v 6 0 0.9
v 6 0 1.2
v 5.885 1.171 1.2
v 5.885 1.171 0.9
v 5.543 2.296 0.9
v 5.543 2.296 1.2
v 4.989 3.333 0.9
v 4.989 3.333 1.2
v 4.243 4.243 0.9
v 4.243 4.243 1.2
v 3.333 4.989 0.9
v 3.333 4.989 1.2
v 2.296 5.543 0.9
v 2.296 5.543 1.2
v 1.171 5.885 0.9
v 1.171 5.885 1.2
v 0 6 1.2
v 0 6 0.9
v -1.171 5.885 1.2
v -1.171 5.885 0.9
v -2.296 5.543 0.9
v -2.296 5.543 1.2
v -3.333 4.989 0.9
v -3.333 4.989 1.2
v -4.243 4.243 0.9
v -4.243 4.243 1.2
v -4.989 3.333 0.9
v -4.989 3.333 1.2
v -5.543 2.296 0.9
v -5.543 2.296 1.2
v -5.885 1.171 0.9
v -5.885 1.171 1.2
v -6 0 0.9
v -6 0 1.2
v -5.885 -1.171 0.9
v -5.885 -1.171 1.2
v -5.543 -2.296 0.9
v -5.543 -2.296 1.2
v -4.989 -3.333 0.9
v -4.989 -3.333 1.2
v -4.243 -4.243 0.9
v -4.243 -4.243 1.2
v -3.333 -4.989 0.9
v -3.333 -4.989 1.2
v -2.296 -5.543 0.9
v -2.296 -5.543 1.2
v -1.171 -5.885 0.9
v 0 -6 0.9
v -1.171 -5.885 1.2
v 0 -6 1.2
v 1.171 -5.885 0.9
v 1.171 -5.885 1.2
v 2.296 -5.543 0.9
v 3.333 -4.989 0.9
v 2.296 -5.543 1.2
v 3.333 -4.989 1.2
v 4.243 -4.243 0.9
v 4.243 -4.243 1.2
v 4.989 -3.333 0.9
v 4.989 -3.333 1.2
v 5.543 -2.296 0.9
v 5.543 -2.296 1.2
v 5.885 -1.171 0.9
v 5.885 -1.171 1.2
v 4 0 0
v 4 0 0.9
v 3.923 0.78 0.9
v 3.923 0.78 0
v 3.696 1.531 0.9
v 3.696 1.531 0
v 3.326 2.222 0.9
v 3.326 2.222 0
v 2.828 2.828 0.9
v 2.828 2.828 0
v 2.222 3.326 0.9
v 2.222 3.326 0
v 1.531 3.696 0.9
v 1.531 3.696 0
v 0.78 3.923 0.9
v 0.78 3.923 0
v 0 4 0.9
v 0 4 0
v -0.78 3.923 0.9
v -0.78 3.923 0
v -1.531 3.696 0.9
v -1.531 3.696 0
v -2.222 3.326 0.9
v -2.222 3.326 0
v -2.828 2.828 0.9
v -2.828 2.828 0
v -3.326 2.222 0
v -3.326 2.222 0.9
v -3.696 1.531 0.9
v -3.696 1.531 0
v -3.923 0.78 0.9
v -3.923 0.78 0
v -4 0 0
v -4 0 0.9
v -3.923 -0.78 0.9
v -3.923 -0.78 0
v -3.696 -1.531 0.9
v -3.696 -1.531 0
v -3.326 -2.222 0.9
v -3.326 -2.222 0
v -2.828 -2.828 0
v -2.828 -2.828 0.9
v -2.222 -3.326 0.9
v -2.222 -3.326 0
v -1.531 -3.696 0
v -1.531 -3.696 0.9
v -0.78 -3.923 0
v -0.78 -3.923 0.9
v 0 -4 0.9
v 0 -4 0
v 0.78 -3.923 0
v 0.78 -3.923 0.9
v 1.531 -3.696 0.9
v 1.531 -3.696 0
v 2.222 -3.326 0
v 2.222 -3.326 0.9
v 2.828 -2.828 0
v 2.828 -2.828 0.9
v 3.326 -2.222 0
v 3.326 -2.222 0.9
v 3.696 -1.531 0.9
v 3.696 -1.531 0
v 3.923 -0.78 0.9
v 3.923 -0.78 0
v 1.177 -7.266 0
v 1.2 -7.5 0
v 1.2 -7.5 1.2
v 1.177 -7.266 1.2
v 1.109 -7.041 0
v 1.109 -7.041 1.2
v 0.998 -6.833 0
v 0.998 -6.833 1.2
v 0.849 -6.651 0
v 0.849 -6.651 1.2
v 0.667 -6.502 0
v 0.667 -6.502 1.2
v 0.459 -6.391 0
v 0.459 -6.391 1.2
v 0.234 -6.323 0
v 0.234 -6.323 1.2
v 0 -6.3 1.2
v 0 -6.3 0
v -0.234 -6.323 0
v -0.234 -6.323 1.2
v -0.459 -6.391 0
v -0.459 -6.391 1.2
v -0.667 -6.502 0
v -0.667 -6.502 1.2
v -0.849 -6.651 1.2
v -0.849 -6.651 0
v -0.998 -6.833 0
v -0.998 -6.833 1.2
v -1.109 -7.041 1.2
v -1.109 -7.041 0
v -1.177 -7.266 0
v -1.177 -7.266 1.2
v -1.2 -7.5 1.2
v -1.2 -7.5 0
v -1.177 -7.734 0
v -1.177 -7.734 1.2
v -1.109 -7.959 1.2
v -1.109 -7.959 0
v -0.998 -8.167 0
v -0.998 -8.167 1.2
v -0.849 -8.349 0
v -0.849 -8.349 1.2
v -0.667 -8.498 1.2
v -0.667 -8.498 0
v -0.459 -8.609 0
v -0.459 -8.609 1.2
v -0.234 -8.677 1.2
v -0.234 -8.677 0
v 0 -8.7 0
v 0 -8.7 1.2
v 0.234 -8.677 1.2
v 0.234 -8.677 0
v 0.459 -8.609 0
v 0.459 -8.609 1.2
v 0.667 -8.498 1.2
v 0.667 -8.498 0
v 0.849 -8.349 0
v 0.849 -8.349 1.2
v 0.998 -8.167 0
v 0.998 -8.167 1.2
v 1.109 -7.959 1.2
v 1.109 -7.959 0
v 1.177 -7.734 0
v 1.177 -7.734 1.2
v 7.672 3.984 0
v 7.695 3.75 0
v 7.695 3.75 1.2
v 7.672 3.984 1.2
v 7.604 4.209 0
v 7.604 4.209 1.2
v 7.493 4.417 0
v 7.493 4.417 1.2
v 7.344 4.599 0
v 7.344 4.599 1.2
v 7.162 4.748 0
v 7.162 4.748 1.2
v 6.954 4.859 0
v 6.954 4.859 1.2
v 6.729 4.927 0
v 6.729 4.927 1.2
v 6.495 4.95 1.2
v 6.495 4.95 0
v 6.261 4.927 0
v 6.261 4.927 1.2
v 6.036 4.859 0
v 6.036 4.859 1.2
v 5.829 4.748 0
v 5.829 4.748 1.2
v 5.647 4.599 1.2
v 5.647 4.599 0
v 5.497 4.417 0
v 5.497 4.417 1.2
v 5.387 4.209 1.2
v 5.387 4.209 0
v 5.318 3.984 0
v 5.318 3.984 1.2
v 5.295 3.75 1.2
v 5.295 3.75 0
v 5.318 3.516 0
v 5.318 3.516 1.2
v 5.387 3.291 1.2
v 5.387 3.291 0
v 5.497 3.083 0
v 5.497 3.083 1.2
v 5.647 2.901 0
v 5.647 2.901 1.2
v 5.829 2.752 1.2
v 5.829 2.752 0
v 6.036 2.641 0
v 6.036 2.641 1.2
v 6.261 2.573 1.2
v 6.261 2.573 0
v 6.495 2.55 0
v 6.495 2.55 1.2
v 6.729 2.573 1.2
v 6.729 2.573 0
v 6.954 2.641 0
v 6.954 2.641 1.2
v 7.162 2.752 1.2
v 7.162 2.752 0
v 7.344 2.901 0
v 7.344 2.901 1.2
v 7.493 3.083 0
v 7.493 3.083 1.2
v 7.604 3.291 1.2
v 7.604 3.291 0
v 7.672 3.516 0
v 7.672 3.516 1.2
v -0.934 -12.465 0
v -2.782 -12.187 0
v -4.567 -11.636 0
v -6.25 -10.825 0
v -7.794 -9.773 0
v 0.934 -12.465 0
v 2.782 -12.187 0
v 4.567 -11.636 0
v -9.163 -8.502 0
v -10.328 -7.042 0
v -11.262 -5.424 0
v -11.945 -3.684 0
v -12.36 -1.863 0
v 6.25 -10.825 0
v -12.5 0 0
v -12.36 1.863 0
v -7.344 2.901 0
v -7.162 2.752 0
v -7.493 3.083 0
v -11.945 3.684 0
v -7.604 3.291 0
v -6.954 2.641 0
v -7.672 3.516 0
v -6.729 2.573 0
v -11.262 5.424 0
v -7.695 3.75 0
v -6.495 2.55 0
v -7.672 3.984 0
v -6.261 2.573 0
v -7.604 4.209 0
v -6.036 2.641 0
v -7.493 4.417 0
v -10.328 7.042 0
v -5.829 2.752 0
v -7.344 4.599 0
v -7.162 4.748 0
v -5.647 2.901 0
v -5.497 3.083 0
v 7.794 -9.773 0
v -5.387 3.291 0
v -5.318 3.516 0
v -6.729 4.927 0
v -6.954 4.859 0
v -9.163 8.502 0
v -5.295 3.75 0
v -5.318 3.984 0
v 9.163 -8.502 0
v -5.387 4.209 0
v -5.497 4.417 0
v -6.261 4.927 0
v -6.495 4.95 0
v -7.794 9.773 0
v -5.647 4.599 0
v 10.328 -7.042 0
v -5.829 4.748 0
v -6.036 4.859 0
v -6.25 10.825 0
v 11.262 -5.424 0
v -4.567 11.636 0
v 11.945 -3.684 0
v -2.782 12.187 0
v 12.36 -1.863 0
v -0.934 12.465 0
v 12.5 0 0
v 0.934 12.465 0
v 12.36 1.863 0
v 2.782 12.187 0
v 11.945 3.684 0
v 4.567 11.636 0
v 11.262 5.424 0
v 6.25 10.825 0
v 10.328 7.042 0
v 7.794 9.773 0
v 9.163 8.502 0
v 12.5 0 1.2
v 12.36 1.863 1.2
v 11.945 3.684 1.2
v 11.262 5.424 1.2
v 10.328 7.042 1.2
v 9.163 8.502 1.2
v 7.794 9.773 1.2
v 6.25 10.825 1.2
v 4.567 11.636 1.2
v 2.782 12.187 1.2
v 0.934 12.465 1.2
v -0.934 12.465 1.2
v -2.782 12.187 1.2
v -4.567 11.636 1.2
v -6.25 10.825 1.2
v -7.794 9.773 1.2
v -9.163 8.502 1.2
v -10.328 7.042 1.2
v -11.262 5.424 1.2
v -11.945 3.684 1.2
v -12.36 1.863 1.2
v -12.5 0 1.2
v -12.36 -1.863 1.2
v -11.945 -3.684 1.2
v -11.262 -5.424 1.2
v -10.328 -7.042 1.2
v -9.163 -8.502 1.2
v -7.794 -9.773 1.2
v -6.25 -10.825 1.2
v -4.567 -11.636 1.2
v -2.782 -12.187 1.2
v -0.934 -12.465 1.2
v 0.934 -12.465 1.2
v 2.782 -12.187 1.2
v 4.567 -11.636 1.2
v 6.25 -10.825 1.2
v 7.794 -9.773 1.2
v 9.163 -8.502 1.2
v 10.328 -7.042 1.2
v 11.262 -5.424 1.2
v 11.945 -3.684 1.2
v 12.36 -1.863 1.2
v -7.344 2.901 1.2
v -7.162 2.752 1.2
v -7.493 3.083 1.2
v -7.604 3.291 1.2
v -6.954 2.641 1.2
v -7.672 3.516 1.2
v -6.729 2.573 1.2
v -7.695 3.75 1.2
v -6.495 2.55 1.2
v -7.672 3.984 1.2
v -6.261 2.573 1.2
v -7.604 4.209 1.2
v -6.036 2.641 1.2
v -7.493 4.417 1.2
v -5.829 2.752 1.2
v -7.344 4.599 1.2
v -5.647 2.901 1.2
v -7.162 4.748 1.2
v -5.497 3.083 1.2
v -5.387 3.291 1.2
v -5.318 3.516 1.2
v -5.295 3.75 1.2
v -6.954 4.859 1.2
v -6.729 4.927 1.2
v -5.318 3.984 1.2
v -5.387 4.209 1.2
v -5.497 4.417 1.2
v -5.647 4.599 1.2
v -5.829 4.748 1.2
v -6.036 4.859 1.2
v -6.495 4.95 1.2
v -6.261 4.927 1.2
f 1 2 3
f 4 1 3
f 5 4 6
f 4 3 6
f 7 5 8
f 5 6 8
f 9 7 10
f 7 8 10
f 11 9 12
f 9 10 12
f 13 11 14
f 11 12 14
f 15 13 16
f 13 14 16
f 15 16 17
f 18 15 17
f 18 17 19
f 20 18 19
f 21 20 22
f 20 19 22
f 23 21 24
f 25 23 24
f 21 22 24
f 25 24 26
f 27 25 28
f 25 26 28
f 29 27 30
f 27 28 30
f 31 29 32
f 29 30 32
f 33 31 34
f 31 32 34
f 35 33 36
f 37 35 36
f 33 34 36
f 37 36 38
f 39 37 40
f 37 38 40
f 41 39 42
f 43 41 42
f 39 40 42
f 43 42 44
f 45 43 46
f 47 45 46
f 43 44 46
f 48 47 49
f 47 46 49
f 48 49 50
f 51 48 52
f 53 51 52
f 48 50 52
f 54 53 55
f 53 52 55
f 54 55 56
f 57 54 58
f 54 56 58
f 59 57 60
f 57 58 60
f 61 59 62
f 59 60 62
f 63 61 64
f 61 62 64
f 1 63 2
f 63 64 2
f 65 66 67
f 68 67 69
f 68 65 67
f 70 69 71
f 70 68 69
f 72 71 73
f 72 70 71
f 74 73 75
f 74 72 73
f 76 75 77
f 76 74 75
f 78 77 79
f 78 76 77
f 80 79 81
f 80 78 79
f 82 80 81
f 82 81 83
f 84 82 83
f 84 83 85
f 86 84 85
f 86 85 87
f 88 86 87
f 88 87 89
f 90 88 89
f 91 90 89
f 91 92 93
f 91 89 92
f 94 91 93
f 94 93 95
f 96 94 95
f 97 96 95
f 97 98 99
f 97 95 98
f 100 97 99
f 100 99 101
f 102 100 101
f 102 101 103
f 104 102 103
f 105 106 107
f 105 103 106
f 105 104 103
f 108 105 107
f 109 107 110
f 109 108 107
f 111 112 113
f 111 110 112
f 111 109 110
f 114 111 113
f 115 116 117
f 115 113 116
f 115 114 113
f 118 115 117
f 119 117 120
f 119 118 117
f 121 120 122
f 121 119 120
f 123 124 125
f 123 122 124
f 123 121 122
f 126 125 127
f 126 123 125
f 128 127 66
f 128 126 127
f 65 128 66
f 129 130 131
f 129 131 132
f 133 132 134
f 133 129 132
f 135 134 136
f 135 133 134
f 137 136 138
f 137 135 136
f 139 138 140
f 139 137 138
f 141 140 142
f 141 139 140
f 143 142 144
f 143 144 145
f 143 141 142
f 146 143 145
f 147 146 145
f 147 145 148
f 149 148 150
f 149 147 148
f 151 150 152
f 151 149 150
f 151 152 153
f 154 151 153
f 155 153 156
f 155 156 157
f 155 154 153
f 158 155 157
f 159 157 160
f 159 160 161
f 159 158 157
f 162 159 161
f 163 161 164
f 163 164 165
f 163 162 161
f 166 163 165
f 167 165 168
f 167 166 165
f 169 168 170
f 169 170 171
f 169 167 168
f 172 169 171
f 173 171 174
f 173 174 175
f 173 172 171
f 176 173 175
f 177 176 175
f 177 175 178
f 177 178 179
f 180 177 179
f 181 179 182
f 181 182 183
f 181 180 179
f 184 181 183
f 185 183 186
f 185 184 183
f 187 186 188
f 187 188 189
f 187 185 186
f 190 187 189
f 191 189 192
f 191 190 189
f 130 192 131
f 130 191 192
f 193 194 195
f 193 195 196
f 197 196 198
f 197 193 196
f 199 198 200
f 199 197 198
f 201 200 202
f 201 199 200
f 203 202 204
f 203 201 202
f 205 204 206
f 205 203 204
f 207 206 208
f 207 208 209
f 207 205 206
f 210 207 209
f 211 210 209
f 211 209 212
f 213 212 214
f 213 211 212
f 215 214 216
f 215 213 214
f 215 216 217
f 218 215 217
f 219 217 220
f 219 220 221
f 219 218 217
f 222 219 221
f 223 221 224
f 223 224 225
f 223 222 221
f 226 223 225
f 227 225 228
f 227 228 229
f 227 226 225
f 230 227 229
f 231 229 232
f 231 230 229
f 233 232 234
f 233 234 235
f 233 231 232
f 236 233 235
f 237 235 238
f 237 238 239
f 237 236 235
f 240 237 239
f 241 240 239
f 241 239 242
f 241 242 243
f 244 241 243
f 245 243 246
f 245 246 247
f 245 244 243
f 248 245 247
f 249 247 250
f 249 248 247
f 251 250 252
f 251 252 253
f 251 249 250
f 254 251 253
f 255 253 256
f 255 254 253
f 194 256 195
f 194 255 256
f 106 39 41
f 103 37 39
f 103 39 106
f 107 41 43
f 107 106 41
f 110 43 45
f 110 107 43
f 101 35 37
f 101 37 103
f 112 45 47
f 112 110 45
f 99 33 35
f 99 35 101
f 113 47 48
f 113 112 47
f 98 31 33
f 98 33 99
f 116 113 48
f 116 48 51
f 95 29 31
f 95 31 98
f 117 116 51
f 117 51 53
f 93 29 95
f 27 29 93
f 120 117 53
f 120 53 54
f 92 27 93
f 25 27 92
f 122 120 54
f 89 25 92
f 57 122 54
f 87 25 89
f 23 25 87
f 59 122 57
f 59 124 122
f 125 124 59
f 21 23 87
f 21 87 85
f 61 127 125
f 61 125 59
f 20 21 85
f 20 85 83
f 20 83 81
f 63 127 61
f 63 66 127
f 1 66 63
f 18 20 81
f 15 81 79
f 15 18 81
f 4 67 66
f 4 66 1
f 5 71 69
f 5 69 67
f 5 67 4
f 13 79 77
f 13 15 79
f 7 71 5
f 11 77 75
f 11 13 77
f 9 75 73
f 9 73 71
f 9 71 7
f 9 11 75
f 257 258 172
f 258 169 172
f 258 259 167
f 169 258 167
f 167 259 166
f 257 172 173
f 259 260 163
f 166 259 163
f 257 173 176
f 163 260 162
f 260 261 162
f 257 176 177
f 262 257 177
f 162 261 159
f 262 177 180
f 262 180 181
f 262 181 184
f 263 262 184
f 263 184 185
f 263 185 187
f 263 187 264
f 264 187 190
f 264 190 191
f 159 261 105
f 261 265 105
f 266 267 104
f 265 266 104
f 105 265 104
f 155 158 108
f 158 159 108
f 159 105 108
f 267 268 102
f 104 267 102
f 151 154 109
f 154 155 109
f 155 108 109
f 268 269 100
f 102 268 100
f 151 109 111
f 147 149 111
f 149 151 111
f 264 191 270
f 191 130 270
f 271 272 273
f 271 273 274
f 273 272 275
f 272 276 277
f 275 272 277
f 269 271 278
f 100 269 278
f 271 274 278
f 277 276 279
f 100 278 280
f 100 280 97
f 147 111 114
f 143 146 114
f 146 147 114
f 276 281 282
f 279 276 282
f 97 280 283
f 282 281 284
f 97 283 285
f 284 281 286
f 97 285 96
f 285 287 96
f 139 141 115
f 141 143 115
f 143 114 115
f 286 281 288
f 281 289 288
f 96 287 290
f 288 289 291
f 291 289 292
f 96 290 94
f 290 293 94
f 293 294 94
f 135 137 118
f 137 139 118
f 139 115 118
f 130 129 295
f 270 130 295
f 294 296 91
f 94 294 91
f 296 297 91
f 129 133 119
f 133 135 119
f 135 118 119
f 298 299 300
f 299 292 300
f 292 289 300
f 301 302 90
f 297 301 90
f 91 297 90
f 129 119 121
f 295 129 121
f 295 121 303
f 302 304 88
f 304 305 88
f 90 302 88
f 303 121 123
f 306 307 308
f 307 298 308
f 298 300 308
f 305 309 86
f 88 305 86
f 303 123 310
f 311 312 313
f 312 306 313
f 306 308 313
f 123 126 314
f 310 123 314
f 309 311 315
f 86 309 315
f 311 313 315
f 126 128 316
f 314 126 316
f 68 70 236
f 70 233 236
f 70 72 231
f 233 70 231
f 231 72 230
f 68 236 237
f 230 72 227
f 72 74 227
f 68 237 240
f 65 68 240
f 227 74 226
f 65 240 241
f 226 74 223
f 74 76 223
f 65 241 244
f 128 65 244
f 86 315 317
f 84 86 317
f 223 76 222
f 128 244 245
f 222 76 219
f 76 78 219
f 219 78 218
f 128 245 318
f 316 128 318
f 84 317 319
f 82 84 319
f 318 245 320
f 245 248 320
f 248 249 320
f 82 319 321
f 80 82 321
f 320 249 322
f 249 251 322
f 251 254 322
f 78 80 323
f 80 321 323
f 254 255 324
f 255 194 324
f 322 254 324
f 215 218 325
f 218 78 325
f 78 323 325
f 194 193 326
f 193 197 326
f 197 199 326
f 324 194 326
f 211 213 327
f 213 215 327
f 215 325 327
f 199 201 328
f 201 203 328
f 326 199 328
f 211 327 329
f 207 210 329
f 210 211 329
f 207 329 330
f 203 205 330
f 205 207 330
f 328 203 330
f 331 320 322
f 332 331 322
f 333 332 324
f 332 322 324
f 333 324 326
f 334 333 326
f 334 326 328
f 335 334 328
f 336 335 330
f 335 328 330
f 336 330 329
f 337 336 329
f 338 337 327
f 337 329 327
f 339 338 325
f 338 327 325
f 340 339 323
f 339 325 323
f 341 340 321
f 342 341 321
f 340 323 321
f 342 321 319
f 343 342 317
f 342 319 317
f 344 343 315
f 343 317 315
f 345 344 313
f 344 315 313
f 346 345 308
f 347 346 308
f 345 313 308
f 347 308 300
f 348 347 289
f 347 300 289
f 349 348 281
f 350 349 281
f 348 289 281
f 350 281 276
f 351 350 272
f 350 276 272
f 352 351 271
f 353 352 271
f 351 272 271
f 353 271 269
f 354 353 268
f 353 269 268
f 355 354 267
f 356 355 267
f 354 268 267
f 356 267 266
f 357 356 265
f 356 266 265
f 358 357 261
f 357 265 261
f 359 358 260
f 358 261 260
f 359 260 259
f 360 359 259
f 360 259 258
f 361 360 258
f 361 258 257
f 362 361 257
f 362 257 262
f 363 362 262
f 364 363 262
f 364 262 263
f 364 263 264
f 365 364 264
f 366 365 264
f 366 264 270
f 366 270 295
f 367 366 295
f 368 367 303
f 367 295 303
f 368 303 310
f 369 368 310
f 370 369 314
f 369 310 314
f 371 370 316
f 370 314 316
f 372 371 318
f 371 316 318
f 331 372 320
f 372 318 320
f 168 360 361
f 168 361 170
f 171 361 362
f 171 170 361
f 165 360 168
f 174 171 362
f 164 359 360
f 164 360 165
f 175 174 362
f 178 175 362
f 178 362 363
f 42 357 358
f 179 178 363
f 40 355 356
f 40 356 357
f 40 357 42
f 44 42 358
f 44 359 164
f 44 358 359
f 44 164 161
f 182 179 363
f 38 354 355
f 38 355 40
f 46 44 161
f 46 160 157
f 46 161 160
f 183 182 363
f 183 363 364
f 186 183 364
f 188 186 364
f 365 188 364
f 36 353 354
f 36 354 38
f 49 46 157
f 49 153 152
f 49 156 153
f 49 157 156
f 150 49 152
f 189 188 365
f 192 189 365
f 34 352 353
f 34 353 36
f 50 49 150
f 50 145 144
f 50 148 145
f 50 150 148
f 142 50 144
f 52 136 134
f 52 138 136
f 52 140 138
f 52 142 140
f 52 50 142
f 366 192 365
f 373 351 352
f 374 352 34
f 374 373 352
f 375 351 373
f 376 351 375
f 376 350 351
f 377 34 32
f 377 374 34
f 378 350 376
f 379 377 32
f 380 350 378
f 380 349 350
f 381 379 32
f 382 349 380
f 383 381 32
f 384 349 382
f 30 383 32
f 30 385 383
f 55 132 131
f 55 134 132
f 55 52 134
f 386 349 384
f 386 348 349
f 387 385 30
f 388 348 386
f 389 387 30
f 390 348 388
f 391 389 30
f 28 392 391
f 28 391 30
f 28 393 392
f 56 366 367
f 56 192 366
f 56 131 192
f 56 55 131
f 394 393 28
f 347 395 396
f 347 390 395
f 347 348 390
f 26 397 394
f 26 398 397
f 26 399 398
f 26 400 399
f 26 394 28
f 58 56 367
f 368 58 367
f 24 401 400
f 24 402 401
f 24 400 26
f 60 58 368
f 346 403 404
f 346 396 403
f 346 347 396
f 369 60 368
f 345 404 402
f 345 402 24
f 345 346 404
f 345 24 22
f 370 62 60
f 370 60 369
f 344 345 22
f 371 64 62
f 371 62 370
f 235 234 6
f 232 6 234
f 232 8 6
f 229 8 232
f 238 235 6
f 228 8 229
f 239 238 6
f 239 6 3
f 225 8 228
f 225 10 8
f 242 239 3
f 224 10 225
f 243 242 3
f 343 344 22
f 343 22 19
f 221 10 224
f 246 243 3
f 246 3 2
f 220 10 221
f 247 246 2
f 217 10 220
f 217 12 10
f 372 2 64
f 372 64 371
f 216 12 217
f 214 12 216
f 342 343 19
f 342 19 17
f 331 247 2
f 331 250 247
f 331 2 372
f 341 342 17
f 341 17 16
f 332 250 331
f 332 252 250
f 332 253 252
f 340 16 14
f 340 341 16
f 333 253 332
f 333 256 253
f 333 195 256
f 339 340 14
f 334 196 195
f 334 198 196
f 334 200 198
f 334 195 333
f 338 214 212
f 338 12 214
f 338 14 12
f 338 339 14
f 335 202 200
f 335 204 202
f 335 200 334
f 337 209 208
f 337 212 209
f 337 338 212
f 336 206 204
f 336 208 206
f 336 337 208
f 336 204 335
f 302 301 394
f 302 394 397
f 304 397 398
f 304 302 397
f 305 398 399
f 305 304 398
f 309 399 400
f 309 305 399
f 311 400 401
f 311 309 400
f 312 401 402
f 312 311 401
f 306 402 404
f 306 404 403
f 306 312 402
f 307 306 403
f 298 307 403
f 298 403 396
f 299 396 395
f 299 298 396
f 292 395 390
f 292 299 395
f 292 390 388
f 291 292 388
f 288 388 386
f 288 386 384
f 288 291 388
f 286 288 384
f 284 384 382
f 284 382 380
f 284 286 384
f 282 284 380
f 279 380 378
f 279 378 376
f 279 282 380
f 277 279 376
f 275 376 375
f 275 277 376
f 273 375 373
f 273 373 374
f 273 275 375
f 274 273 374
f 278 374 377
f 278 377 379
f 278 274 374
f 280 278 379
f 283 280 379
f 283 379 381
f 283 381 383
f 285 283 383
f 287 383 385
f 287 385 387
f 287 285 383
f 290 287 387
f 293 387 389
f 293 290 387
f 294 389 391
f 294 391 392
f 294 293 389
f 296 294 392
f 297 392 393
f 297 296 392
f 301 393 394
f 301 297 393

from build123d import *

# Parameters (mm, degrees)
SKETCH_1_R          = 12.5
SKETCH_1_R_2        = 4
SKETCH_1_R_3        = 1.2
EXTRUDE_1_DEPTH     = 1.2
SKETCH_3_R          = 6
CUT_EXTRUDE_2_DEPTH = 0.3


with BuildPart() as part:
    # 草图1 → 凸台-拉伸1 (new body)
    with BuildSketch(Plane.XY):
        Circle(SKETCH_1_R)
        Circle(SKETCH_1_R_2, mode=Mode.SUBTRACT)
        with Locations((0, -7.5)):
            Circle(SKETCH_1_R_3, mode=Mode.SUBTRACT)
        with Locations((-6.495190528, 3.75)):
            Circle(SKETCH_1_R_3, mode=Mode.SUBTRACT)
        with Locations((6.495190528, 3.75)):
            Circle(SKETCH_1_R_3, mode=Mode.SUBTRACT)
    extrude(amount=EXTRUDE_1_DEPTH)

    # 草图3 → 切除-拉伸2 (cut)
    with BuildSketch(Plane.XY.offset(1.2)):
        Circle(SKETCH_3_R)
    extrude(amount=-CUT_EXTRUDE_2_DEPTH, mode=Mode.SUBTRACT)


solid = part.part
